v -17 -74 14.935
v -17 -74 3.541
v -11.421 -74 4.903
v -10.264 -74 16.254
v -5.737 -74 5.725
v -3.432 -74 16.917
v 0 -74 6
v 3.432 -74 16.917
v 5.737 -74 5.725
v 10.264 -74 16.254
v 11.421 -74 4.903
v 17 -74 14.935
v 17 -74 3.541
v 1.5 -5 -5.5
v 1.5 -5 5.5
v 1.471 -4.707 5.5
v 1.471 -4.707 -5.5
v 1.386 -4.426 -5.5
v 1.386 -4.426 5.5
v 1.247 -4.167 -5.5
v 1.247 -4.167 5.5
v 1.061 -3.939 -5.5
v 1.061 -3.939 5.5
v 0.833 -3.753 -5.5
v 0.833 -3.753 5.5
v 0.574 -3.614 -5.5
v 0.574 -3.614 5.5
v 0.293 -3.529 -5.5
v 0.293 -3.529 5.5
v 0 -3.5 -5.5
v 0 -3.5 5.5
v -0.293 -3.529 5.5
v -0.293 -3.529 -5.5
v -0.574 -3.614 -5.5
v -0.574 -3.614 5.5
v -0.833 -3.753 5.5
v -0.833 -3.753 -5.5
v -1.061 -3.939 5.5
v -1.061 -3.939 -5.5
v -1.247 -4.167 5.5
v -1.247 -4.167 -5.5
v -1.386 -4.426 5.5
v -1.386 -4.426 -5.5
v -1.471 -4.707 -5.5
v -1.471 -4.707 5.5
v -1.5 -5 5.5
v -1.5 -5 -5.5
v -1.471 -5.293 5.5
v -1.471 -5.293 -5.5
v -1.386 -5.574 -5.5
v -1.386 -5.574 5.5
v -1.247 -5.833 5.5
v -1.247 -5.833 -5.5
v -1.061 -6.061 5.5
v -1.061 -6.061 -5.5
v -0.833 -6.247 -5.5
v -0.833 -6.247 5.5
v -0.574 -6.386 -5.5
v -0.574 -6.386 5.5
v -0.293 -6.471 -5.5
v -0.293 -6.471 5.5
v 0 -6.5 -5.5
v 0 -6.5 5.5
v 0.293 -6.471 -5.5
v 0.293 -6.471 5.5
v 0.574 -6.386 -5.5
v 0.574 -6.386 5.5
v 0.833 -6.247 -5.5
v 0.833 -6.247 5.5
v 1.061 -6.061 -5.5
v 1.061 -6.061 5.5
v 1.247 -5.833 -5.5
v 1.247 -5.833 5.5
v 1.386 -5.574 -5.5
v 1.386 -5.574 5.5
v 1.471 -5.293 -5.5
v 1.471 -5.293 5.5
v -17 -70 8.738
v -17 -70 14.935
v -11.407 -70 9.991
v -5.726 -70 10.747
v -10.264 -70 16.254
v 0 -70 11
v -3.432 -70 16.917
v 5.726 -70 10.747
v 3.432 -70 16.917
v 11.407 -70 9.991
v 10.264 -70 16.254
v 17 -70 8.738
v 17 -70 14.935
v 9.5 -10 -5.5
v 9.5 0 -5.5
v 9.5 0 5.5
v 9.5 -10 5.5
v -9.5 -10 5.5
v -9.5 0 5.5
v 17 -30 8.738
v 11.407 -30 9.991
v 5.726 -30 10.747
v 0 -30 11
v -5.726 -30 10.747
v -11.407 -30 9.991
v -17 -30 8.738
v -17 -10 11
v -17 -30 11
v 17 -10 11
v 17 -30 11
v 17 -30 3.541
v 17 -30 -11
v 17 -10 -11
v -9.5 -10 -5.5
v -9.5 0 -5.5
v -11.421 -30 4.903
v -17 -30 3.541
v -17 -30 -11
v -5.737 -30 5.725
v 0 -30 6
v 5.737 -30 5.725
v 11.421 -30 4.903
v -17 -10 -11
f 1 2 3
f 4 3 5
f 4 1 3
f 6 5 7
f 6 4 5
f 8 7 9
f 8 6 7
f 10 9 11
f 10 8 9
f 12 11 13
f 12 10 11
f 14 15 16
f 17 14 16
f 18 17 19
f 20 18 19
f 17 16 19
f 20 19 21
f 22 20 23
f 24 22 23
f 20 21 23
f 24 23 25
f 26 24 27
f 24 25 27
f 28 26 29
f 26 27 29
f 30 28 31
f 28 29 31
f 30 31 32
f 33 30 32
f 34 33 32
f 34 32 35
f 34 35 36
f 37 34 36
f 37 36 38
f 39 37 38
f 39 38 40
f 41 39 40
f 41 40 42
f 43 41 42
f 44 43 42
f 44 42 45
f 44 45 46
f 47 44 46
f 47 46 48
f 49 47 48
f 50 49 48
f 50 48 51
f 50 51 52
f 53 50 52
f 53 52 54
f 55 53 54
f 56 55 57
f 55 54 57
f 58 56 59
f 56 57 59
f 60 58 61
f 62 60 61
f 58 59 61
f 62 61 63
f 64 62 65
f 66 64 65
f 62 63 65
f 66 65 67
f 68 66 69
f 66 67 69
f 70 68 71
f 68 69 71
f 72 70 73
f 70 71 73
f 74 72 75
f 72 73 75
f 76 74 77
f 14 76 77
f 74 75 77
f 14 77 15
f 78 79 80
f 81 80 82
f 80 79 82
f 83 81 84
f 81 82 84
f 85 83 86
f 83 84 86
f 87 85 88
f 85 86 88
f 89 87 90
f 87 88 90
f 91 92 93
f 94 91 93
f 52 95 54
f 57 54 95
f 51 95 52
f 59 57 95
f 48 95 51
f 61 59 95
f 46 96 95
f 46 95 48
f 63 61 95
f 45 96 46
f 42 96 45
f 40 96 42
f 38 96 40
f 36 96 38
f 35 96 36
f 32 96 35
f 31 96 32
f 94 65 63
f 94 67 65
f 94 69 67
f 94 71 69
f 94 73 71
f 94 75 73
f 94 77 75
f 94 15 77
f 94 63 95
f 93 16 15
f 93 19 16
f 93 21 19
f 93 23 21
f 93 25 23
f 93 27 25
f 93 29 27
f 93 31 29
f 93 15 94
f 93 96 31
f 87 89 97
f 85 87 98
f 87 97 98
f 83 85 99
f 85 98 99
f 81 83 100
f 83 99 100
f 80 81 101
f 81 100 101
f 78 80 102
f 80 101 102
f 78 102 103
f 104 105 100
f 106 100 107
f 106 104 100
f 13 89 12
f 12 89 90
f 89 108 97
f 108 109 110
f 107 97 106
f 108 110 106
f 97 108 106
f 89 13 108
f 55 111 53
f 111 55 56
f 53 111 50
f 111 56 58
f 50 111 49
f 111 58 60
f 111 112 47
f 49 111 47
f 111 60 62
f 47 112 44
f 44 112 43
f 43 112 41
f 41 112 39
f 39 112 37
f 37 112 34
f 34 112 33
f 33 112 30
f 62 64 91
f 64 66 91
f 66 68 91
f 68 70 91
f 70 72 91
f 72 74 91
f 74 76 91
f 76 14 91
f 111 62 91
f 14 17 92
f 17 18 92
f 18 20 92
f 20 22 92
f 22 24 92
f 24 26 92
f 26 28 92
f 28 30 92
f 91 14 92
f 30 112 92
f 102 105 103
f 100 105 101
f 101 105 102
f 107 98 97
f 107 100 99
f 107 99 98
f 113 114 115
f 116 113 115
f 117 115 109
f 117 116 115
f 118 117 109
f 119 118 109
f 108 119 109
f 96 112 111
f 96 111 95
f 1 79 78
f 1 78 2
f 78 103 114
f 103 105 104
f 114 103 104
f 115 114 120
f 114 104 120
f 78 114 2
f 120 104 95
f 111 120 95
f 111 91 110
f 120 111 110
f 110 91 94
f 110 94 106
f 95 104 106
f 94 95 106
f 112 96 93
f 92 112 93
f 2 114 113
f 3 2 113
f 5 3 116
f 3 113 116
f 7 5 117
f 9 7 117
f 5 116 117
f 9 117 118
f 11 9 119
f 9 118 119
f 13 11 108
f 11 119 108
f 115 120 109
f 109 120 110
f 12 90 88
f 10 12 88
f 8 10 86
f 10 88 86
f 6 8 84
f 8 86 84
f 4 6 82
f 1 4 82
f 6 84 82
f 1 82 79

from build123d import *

# Parameters (mm, degrees)
F0_W     = 19
F0_H     = 11
F1_DEPTH = 10
F2_W     = 34
F2_H     = 22
F3_DEPTH = 20
F5_DEPTH = 40
F7_DEPTH = 4
F8_R     = 1.5
F9_DEPTH = 16.501


with BuildPart() as f1:
    # F0 (on Front) → F1 (new body)
    with BuildSketch(Plane.XZ):
        Rectangle(F0_W, F0_H)
    extrude(amount=F1_DEPTH)

    # F2 (on face) → F3 (join)
    with BuildSketch(Plane.XZ.offset(10)):
        Rectangle(F2_W, F2_H)
    extrude(amount=F3_DEPTH)

    # F4 (on face) → F5 (join)
    with BuildSketch(Plane.XZ.offset(30)):
        with BuildLine():
            Line((17, 3.54129), (17, 8.737549))
            ThreePointArc((17, 8.737549), (0, 11), (-17, 8.737549))
            Line((-17, 8.737549), (-17, 3.54129))
            ThreePointArc((-17, 3.54129), (0, 6), (17, 3.54129))
        make_face()
    extrude(amount=F5_DEPTH)

    # F6 (on face) → F7 (join)
    with BuildSketch(Plane.XZ.offset(70)):
        with BuildLine():
            Line((-17, 8.737549), (-17, 3.54129))
            ThreePointArc((-17, 3.54129), (0, 6), (17, 3.54129))
            Line((17, 3.54129), (17, 8.737549))
            Line((17, 8.737549), (17, 14.934752))
            ThreePointArc((17, 14.934752), (0, 17), (-17, 14.934752))
            Line((-17, 14.934752), (-17, 8.737549))
        make_face()
    extrude(amount=F7_DEPTH)

    # F8 (on face) → F9 (cut, through all)
    with BuildSketch(Plane.XY.offset(5.5)):
        with Locations((0, -5)):
            Circle(F8_R)
    extrude(amount=-F9_DEPTH, mode=Mode.SUBTRACT)


solid = f1.part
